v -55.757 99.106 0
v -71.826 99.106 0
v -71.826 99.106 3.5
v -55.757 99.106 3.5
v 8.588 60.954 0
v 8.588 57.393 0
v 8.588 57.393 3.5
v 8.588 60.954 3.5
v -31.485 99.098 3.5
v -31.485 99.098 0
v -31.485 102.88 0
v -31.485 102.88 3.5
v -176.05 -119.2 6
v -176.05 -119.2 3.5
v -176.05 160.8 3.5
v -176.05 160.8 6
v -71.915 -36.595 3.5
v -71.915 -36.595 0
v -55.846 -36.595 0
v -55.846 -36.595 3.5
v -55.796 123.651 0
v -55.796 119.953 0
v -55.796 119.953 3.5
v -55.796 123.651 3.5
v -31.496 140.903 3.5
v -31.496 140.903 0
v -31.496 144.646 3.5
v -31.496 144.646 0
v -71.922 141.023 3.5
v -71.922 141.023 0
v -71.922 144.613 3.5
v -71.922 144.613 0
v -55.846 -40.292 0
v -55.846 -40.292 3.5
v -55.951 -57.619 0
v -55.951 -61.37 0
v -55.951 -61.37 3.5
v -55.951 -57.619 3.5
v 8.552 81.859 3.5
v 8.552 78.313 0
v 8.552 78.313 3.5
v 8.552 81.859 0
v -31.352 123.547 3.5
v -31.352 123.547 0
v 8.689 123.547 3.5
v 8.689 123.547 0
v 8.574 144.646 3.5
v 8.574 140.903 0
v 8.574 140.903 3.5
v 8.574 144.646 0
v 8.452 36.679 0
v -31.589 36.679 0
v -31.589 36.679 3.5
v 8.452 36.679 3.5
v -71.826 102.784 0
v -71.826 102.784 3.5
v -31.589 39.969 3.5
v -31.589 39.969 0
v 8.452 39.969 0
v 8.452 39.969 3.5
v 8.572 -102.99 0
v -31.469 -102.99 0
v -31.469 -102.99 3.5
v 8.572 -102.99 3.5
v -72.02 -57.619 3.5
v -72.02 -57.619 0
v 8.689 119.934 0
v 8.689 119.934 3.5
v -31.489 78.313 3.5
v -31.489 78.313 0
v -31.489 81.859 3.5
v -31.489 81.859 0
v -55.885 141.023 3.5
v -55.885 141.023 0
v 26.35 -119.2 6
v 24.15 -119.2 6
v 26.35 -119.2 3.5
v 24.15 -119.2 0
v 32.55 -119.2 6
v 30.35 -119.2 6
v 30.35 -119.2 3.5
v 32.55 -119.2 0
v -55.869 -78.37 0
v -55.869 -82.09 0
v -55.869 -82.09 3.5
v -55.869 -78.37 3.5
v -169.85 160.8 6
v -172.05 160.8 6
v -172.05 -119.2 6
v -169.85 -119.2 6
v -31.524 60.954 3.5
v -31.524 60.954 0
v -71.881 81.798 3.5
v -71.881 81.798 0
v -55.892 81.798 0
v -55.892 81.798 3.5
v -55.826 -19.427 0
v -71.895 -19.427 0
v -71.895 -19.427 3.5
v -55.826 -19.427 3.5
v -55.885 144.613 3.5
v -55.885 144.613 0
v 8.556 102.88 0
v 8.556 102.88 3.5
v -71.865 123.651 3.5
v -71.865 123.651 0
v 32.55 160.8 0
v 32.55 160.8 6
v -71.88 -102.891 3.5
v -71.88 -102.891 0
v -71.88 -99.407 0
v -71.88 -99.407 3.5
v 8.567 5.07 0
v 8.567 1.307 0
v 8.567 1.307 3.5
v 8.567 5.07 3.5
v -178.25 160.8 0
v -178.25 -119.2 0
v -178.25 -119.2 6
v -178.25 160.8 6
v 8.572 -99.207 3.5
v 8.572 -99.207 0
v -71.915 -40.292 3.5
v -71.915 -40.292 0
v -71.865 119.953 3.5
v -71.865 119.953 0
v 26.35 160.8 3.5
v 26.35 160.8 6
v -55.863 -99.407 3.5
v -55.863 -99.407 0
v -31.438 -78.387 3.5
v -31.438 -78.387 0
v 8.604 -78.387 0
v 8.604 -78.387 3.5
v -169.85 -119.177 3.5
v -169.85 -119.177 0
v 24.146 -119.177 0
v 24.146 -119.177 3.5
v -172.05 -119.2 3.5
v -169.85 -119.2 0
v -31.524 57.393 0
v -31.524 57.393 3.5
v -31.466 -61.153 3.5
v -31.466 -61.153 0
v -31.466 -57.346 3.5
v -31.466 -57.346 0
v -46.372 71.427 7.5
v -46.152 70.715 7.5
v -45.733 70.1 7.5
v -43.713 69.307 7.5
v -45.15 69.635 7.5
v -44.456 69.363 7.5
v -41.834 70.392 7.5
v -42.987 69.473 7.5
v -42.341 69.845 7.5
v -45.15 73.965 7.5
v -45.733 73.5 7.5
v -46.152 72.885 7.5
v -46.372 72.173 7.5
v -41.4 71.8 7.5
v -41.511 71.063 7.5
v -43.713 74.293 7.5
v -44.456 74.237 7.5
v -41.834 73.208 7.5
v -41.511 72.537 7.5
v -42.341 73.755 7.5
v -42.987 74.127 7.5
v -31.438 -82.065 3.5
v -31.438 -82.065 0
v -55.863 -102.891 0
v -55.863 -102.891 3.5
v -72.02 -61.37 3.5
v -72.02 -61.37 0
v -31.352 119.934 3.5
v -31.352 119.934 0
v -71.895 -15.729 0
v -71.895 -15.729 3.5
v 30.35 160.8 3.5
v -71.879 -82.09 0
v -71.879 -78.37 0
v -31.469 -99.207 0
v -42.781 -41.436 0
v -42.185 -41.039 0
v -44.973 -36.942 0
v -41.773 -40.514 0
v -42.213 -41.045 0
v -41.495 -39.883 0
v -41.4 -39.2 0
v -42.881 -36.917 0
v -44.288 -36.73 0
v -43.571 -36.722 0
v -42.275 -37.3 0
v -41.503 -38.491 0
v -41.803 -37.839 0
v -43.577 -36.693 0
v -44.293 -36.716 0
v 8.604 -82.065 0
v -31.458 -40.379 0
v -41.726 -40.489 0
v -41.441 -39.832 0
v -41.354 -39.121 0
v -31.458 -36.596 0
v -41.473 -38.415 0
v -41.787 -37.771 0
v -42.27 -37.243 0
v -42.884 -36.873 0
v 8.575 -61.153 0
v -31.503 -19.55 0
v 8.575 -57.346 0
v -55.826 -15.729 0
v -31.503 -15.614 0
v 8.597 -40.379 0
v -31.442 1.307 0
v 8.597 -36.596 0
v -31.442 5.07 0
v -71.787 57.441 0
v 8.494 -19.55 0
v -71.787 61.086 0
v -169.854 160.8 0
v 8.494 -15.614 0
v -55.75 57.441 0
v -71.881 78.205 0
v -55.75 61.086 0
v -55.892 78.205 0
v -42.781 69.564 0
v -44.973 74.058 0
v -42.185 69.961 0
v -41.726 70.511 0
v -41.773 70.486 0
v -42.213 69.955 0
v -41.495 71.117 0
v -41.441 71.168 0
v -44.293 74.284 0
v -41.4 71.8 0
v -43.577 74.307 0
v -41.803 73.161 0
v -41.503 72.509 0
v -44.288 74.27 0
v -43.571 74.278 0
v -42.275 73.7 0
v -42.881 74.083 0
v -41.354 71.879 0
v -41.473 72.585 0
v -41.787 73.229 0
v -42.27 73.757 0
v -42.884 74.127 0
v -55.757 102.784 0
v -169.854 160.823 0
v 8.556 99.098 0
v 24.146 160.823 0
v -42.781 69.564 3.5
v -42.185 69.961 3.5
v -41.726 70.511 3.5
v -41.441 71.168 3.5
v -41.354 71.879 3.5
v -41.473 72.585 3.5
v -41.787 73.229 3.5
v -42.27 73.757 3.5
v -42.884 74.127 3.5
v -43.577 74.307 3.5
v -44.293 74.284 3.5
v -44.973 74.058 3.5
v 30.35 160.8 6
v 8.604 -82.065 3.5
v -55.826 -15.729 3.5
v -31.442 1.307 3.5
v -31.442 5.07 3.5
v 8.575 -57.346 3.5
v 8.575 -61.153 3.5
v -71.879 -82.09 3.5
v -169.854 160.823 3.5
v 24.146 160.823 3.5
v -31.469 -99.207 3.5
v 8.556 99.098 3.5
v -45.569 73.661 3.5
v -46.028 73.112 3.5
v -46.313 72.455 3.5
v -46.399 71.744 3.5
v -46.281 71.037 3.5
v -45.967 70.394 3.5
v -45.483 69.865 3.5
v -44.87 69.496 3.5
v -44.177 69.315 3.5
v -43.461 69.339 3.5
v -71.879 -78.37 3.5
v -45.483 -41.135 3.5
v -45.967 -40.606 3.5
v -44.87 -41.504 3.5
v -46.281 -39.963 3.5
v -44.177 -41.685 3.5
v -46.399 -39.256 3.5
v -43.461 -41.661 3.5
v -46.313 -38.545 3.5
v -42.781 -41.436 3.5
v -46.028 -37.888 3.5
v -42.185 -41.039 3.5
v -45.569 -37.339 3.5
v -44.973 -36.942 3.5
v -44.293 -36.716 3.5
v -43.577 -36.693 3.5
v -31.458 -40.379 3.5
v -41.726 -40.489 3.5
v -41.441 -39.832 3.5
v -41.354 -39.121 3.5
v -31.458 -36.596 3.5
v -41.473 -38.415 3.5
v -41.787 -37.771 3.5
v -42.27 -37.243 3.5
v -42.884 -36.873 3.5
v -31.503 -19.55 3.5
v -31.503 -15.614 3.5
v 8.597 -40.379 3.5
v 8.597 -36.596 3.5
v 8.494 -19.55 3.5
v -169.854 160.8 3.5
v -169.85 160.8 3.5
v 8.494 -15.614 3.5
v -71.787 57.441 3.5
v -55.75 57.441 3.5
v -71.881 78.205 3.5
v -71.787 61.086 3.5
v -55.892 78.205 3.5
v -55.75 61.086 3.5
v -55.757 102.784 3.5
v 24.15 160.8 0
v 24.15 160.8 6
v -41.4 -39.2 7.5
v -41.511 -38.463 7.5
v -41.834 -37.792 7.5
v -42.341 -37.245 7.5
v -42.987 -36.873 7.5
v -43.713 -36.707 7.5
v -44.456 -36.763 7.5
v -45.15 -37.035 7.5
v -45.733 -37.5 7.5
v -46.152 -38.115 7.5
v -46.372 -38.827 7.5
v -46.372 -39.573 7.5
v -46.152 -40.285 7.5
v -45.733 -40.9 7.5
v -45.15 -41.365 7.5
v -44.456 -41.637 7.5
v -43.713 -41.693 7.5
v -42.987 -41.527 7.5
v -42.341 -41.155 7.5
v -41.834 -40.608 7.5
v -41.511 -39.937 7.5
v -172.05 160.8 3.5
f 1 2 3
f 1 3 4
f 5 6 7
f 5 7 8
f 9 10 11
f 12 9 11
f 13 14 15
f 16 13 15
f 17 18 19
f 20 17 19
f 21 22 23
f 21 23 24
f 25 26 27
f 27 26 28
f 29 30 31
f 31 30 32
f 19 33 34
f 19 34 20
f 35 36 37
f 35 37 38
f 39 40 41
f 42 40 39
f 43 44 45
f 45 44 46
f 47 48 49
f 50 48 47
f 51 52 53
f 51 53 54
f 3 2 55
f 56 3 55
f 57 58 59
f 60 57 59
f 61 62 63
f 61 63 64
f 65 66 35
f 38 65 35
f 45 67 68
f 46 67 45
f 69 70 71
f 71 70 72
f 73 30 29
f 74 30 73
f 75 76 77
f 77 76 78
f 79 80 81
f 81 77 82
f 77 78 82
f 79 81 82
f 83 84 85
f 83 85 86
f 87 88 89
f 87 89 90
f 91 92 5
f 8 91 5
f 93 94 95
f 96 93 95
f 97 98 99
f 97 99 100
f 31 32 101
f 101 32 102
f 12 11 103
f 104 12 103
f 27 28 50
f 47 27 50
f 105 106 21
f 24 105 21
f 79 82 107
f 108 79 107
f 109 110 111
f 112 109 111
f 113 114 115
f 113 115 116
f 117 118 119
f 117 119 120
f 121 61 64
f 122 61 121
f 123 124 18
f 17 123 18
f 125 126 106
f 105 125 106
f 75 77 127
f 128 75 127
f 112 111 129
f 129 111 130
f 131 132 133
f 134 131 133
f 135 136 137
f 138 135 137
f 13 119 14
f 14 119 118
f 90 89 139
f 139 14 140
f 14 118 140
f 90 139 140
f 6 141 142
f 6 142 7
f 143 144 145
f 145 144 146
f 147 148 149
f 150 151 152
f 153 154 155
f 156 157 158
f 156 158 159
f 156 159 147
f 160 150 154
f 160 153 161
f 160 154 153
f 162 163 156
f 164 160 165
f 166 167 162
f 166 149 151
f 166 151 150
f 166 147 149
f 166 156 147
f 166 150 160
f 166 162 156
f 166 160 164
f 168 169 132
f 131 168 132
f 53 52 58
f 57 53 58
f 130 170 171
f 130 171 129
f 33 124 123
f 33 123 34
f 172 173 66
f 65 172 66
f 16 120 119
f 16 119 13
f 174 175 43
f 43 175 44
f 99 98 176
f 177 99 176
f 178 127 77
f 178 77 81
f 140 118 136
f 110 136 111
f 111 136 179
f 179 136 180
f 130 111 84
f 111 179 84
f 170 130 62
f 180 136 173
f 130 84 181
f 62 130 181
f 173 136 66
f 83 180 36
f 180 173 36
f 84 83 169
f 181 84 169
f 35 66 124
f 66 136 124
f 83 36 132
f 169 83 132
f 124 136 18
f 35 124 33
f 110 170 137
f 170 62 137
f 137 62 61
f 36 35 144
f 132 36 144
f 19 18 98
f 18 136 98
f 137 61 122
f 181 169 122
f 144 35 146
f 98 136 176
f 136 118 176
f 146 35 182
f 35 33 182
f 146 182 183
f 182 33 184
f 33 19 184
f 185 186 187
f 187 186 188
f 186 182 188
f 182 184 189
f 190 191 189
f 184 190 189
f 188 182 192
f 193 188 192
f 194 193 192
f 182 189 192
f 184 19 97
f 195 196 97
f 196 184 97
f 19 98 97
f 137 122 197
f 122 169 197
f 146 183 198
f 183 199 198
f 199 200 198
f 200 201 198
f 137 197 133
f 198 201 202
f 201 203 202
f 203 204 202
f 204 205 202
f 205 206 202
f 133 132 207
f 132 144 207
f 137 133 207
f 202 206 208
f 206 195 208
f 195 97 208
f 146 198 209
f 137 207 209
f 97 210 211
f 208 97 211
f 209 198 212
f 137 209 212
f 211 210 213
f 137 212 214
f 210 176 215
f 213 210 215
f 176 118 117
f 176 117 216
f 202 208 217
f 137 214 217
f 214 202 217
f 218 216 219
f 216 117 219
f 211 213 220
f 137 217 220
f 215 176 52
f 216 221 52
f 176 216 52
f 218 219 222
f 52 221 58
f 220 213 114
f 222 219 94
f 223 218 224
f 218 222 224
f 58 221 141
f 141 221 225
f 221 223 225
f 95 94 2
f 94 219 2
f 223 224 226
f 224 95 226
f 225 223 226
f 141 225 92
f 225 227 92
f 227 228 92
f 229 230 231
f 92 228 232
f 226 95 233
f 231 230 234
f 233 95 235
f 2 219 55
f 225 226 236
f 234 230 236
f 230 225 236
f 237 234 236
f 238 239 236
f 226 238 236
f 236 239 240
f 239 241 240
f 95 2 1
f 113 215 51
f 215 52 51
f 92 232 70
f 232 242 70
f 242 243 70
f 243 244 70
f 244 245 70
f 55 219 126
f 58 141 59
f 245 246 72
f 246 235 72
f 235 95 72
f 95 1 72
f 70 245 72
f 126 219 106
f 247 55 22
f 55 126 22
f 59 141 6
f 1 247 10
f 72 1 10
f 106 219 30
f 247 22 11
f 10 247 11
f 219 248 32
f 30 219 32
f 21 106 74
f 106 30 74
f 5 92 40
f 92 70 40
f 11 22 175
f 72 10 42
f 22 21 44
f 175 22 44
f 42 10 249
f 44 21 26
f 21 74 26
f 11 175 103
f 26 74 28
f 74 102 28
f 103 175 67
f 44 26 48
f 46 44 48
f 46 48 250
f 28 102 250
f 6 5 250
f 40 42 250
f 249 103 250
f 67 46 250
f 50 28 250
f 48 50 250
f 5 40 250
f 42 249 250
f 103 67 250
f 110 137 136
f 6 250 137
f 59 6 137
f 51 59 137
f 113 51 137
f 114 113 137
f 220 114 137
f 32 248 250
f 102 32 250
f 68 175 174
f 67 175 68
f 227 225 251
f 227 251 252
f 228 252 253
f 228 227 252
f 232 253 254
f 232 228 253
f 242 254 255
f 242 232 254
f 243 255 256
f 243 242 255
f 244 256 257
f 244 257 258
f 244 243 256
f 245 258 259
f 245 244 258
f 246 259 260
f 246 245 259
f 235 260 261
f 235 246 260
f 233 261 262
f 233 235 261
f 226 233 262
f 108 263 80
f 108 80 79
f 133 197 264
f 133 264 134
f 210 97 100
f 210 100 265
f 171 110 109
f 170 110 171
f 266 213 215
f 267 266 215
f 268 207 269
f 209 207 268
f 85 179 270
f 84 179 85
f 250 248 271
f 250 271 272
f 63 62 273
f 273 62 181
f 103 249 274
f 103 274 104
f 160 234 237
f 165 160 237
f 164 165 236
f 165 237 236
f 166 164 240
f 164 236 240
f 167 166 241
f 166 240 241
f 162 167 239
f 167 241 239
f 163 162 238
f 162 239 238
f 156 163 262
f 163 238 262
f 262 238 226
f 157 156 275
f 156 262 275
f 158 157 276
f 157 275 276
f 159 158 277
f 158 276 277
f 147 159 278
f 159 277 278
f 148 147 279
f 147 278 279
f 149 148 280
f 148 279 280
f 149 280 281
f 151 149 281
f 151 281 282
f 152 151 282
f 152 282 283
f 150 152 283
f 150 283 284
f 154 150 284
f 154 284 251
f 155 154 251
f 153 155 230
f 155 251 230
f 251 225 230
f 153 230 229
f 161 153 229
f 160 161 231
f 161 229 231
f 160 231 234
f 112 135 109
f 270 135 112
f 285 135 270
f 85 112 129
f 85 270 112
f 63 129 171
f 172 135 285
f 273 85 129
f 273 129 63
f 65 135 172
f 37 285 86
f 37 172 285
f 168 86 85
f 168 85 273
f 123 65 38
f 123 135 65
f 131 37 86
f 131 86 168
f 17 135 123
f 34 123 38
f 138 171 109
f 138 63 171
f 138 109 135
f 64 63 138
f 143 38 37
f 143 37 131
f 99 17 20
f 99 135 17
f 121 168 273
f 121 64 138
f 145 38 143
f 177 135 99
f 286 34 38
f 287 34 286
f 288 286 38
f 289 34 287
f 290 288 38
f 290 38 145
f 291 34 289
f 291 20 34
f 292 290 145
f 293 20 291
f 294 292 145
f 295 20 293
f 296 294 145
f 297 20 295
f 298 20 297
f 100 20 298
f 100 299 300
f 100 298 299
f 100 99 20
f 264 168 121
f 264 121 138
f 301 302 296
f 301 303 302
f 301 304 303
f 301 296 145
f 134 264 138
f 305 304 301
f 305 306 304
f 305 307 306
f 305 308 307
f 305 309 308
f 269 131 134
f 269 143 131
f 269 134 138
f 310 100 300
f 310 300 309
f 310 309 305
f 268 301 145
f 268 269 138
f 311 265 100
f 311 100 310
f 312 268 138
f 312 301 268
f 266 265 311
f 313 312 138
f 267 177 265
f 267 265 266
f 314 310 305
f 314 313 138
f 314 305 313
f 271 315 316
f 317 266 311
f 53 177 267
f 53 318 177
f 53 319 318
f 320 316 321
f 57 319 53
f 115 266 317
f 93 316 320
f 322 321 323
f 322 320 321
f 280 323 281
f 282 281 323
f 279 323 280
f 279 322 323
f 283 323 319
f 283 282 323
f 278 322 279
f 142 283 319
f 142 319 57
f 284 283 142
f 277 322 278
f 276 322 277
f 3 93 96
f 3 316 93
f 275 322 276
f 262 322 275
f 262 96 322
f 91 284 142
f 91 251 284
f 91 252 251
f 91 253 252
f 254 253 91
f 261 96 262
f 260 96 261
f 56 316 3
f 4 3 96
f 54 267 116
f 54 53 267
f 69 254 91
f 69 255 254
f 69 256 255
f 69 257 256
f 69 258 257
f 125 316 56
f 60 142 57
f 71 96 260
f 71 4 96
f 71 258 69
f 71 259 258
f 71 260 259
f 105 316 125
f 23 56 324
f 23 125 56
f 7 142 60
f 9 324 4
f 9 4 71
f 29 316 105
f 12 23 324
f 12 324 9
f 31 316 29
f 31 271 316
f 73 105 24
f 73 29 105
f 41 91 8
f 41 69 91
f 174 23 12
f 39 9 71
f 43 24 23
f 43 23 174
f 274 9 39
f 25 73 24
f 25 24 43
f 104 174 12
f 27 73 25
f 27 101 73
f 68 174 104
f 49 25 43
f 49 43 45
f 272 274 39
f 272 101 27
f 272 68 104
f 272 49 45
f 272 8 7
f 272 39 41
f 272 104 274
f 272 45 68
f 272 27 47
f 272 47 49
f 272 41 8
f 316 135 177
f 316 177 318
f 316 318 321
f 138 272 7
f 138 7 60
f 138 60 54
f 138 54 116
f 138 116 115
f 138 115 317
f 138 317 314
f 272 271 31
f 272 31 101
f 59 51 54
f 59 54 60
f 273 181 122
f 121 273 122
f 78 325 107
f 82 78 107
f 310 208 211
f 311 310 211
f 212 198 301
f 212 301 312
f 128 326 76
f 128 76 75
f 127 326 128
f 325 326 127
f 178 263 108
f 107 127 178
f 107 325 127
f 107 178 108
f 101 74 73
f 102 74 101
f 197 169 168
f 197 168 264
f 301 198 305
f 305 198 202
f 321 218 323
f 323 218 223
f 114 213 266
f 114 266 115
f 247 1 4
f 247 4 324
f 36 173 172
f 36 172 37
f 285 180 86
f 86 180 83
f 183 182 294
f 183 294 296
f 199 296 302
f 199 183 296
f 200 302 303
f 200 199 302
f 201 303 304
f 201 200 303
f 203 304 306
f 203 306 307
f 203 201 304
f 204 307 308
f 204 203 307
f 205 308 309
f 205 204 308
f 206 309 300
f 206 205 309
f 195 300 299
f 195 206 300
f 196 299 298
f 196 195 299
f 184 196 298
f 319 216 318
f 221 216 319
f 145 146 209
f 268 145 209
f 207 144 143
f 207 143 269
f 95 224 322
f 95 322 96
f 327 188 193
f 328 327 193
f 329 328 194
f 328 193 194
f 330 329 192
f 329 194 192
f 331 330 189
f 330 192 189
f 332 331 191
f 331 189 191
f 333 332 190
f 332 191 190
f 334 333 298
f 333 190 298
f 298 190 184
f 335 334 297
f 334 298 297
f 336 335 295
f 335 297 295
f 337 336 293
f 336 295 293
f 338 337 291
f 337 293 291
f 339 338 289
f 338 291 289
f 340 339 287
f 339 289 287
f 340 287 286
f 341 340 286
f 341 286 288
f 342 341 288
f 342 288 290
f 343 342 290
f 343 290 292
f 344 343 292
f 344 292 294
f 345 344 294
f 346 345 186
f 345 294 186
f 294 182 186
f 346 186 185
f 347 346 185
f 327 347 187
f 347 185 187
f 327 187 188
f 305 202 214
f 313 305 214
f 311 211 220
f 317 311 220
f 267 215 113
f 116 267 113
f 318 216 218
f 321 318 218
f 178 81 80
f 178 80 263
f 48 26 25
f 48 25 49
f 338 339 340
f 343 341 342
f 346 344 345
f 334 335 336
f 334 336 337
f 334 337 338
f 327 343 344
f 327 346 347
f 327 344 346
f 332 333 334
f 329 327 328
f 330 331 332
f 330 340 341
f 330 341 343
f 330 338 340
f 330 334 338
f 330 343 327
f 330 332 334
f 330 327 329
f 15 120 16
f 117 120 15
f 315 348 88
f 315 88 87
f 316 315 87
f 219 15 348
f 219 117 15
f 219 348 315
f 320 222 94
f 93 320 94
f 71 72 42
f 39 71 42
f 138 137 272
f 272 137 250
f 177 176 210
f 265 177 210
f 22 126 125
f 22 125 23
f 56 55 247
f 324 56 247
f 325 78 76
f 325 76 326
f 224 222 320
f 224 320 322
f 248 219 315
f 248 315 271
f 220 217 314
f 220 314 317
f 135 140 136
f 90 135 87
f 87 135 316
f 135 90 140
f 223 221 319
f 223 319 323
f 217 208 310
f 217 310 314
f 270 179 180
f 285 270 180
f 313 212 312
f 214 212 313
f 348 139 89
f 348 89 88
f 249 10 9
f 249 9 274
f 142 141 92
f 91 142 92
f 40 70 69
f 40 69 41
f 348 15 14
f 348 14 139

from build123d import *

# Parameters (mm, degrees)
CYLINDER_R        = 2.5
CYLINDER_DEPTH    = 7.5
CYLINDER001_R     = 2.5
CYLINDER001_DEPTH = 7.5
SKETCH001_W       = 194
SKETCH001_H       = 280
SKETCH001_R       = 2.5
SKETCH001_W_2     = 40.070037
SKETCH001_H_2     = 3.742279
SKETCH001_W_3     = 40.041212
SKETCH001_H_3     = 3.613129
SKETCH001_W_4     = 40.041216
SKETCH001_H_4     = 3.782791
SKETCH001_W_5     = 40.041217
SKETCH001_H_5     = 3.546326
SKETCH001_W_6     = 40.112851
SKETCH001_H_6     = 3.561458
SKETCH001_W_7     = 40.04122
SKETCH001_H_7     = 3.290631
SKETCH001_W_8     = 40.009301
SKETCH001_H_8     = 3.763773
SKETCH001_W_9     = 39.996402
SKETCH001_H_9     = 3.935853
SKETCH001_W_10    = 40.055051
SKETCH001_H_10    = 3.782642
SKETCH001_H_11    = 3.806805
SKETCH001_W_11    = 40.041219
SKETCH001_H_12    = 3.677757
SKETCH001_H_13    = 3.782761
SKETCH001_W_12    = 16.037044
SKETCH001_H_14    = 3.589706
SKETCH001_W_13    = 16.068943
SKETCH001_H_15    = 3.697831
SKETCH001_W_14    = 15.989025
SKETCH001_H_16    = 3.592186
SKETCH001_W_15    = 16.03704
SKETCH001_H_17    = 3.644962
SKETCH001_W_16    = 16.06895
SKETCH001_H_18    = 3.697864
SKETCH001_H_19    = 3.697834
SKETCH001_W_17    = 16.068947
SKETCH001_H_20    = 3.750667
SKETCH001_W_18    = 16.010303
SKETCH001_H_21    = 3.719536
SKETCH001_W_19    = 16.017021
SKETCH001_H_22    = 3.484192
EXTRUDE001_DEPTH  = 3.5
BOX016_W          = 4
BOX016_H          = 280
BOX016_DEPTH      = 3.5
BOX018_W          = 2.2
BOX018_H          = 280
BOX018_DEPTH      = 6
BOX017_W          = 2.2
BOX017_H          = 280
BOX017_DEPTH      = 6
BOX019_W          = 4
BOX019_H          = 280
BOX019_DEPTH      = 3.5
BOX021_W          = 2.2
BOX021_H          = 280
BOX021_DEPTH      = 6
BOX020_W          = 2.2
BOX020_H          = 280
BOX020_DEPTH      = 6


with BuildPart() as cylinder:
    # Cylinder → Cylinder (new body)
    with BuildSketch(Plane(origin=(-43.9, -39.2, 0), x_dir=(1, 0, 0), z_dir=(0, 0, 1))):
        Circle(CYLINDER_R)
    extrude(amount=CYLINDER_DEPTH)


with BuildPart() as cylinder001:
    # Cylinder001 → Cylinder001 (new body)
    with BuildSketch(Plane(origin=(-43.9, 71.8, 0), x_dir=(1, 0, 0), z_dir=(0, 0, 1))):
        Circle(CYLINDER001_R)
    extrude(amount=CYLINDER001_DEPTH)


with BuildPart() as plate:
    # Sketch001 → Extrude001 (new body)
    with BuildSketch(Plane.XY):
        with Locations((-72.853731, 20.822565)):
            Rectangle(SKETCH001_W, SKETCH001_H)
        with Locations((-43.853731, 71.822565)):
            Circle(SKETCH001_R, mode=Mode.SUBTRACT)
        with Locations((-43.853731, -39.177435)):
            Circle(SKETCH001_R, mode=Mode.SUBTRACT)
        with Locations((-11.460887, 142.774628)):
            Rectangle(SKETCH001_W_2, SKETCH001_H_2, mode=Mode.SUBTRACT)
        with Locations((-11.331136, 121.740501)):
            Rectangle(SKETCH001_W_3, SKETCH001_H_3, mode=Mode.SUBTRACT)
        with Locations((-11.464432, 100.989097)):
            Rectangle(SKETCH001_W_4, SKETCH001_H_4, mode=Mode.SUBTRACT)
        with Locations((-11.468796, 80.086075)):
            Rectangle(SKETCH001_W_5, SKETCH001_H_5, mode=Mode.SUBTRACT)
        with Locations((-11.467992, 59.173418)):
            Rectangle(SKETCH001_W_6, SKETCH001_H_6, mode=Mode.SUBTRACT)
        with Locations((-11.56887, 38.323995)):
            Rectangle(SKETCH001_W_7, SKETCH001_H_7, mode=Mode.SUBTRACT)
        with Locations((-11.437161, 3.188404)):
            Rectangle(SKETCH001_W_8, SKETCH001_H_8, mode=Mode.SUBTRACT)
        with Locations((-11.504416, -17.581663)):
            Rectangle(SKETCH001_W_9, SKETCH001_H_9, mode=Mode.SUBTRACT)
        with Locations((-11.430497, -38.487215)):
            Rectangle(SKETCH001_W_10, SKETCH001_H_10, mode=Mode.SUBTRACT)
        with Locations((-11.445175, -59.249788)):
            Rectangle(SKETCH001_W_5, SKETCH001_H_11, mode=Mode.SUBTRACT)
        with Locations((-11.417095, -80.225971)):
            Rectangle(SKETCH001_W_11, SKETCH001_H_12, mode=Mode.SUBTRACT)
        with Locations((-11.448836, -101.098243)):
            Rectangle(SKETCH001_W_11, SKETCH001_H_13, mode=Mode.SUBTRACT)
        with Locations((-63.903541, 142.81797)):
            Rectangle(SKETCH001_W_12, SKETCH001_H_14, mode=Mode.SUBTRACT)
        with Locations((-63.830264, 121.801971)):
            Rectangle(SKETCH001_W_13, SKETCH001_H_15, mode=Mode.SUBTRACT)
        with Locations((-63.791866, 100.945217)):
            Rectangle(SKETCH001_W_13, SKETCH001_H_12, mode=Mode.SUBTRACT)
        with Locations((-63.886082, 80.001514)):
            Rectangle(SKETCH001_W_14, SKETCH001_H_16, mode=Mode.SUBTRACT)
        with Locations((-63.768631, 59.263056)):
            Rectangle(SKETCH001_W_15, SKETCH001_H_17, mode=Mode.SUBTRACT)
        with Locations((-63.860941, -17.577925)):
            Rectangle(SKETCH001_W_16, SKETCH001_H_18, mode=Mode.SUBTRACT)
        with Locations((-63.880459, -38.44348)):
            Rectangle(SKETCH001_W_13, SKETCH001_H_19, mode=Mode.SUBTRACT)
        with Locations((-63.985134, -59.494722)):
            Rectangle(SKETCH001_W_17, SKETCH001_H_20, mode=Mode.SUBTRACT)
        with Locations((-63.874309, -80.230259)):
            Rectangle(SKETCH001_W_18, SKETCH001_H_21, mode=Mode.SUBTRACT)
        with Locations((-63.871902, -101.148766)):
            Rectangle(SKETCH001_W_19, SKETCH001_H_22, mode=Mode.SUBTRACT)
    extrude(amount=EXTRUDE001_DEPTH)

    # Fusion: union Cylinder, Cylinder001
    add(cylinder.part)
    add(cylinder001.part)


with BuildPart() as cube016:
    # Box016 → Box016 (new body)
    with BuildSketch(Plane(origin=(26.35, -119.2, 0), x_dir=(1, 0, 0), z_dir=(0, 0, 1))):
        with Locations((2, 140)):
            Rectangle(BOX016_W, BOX016_H)
    extrude(amount=BOX016_DEPTH)


with BuildPart() as cube018:
    # Box018 → Box018 (new body)
    with BuildSketch(Plane(origin=(30.35, -119.2, 0), x_dir=(1, 0, 0), z_dir=(0, 0, 1))):
        with Locations((1.1, 140)):
            Rectangle(BOX018_W, BOX018_H)
    extrude(amount=BOX018_DEPTH)


with BuildPart() as fusion001:
    # Box017 → Box017 (new body)
    with BuildSketch(Plane(origin=(24.15, -119.2, 0), x_dir=(1, 0, 0), z_dir=(0, 0, 1))):
        with Locations((1.1, 140)):
            Rectangle(BOX017_W, BOX017_H)
    extrude(amount=BOX017_DEPTH)

    # Fusion001: union Cube016, Cube018
    add(cube016.part)
    add(cube018.part)


with BuildPart() as cube019:
    # Box019 → Box019 (new body)
    with BuildSketch(Plane(origin=(26.35, -119.2, 0), x_dir=(1, 0, 0), z_dir=(0, 0, 1))):
        with Locations((2, 140)):
            Rectangle(BOX019_W, BOX019_H)
    extrude(amount=BOX019_DEPTH)


with BuildPart() as cube021:
    # Box021 → Box021 (new body)
    with BuildSketch(Plane(origin=(30.35, -119.2, 0), x_dir=(1, 0, 0), z_dir=(0, 0, 1))):
        with Locations((1.1, 140)):
            Rectangle(BOX021_W, BOX021_H)
    extrude(amount=BOX021_DEPTH)


with BuildPart() as plate001:
    # Box020 → Box020 (new body)
    with BuildSketch(Plane(origin=(24.15, -119.2, 0), x_dir=(1, 0, 0), z_dir=(0, 0, 1))):
        with Locations((1.1, 140)):
            Rectangle(BOX020_W, BOX020_H)
    extrude(amount=BOX020_DEPTH)

    # Fusion002: union Cube019, Cube021
    add(cube019.part)
    add(cube021.part)


with BuildPart() as plate001_1:
    # Fusion002 placement: moved
    add(plate001.part.moved(Location((-202.4, 0, 0))))

    # Fusion027: union plate, Fusion001
    add(plate.part)
    add(fusion001.part)


solid = plate001_1.part
